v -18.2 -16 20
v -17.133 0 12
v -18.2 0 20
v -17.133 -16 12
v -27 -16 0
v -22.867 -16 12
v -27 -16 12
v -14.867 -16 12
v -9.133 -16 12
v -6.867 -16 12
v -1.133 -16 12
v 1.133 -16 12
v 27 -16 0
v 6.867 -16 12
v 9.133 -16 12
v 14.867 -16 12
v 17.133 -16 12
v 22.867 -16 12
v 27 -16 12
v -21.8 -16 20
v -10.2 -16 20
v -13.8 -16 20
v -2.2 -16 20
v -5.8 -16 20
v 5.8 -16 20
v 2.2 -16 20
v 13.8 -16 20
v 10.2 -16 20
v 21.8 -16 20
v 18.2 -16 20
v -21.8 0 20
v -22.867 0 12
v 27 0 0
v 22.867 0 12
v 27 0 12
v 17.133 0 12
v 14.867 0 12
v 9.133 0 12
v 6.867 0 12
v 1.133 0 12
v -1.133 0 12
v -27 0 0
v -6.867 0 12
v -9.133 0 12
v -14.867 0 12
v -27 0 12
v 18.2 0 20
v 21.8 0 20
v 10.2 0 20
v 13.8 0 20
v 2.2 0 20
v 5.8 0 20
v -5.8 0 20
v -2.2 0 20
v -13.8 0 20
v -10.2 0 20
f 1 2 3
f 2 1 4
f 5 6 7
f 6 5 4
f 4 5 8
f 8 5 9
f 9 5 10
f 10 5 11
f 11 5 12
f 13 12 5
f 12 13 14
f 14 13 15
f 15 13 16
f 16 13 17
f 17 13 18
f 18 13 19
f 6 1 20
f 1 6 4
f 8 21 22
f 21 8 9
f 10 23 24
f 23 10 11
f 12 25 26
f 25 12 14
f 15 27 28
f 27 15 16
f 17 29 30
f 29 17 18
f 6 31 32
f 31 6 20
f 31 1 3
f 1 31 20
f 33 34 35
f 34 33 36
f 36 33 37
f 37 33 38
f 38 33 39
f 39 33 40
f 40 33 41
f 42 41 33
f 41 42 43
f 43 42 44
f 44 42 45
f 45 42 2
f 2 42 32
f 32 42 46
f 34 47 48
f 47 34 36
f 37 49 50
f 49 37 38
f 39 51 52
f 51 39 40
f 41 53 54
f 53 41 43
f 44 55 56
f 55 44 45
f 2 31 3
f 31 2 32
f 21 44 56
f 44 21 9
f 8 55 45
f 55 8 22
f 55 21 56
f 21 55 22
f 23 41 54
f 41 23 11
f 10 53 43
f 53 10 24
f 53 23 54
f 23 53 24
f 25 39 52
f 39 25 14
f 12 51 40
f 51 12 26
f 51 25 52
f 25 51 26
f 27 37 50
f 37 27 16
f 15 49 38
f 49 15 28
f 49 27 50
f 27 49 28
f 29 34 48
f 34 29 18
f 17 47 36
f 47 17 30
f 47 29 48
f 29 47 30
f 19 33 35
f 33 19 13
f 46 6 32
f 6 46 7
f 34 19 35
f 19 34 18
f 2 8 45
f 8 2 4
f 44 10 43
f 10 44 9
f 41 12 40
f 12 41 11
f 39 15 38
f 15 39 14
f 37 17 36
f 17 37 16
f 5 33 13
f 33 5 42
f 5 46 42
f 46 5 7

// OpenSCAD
$fn = 32;

// ----------------------------------------------------------------------
// Toothed rack, 6 teeth
// 8 mm pitch, 8 mm teeth
// ----------------------------------------------------------------------

// --- parameters (mm) ---
bar_w = 16;     // bar width (Y)
bar_h = 12;     // bar height (Z)
teeth = 6;      // number of teeth
pitch = 8;      // tooth pitch
tooth_h = 8;    // tooth height above the bar
root_w = 6;     // tooth width at the root
crest_w = 3.6;  // tooth width at the crest

// --- derived feature positions (mm) ---
span = (teeth - 1) * pitch;  // = 40   distance between the outer teeth
bar_l = span + root_w + 8;   // = 54   bar length: teeth plus 4 mm at each end
tooth_x = -span / 2;         // = -20   X of the first tooth
height = bar_h + tooth_h;    // = 20   overall height
feature_centers = [
  [tooth_x + 0 * pitch, -bar_w / 2],
  [tooth_x + 1 * pitch, -bar_w / 2],
  [tooth_x + 2 * pitch, -bar_w / 2],
  [tooth_x + 3 * pitch, -bar_w / 2],
  [tooth_x + 4 * pitch, -bar_w / 2],
  [tooth_x + 5 * pitch, -bar_w / 2]
];   // tooth centre line, drives the tooth loop

// bar with a rack of teeth, one extruded trapezoium per centre
module rack_tooth() {
  linear_extrude(height = bar_w)
    polygon(points = [
      [0, 0],
      [root_w, 0],
      [root_w / 2 + crest_w / 2, tooth_h + 1],
      [root_w / 2 - crest_w / 2, tooth_h + 1]
    ]);
}

union() {
  translate([-bar_l / 2, -bar_w, 0]) cube([bar_l, bar_w, bar_h]);
  for (centre = feature_centers)
    translate([centre[0] - root_w / 2, 0, bar_h - 1]) rotate([90, 0, 0]) rack_tooth();
}
